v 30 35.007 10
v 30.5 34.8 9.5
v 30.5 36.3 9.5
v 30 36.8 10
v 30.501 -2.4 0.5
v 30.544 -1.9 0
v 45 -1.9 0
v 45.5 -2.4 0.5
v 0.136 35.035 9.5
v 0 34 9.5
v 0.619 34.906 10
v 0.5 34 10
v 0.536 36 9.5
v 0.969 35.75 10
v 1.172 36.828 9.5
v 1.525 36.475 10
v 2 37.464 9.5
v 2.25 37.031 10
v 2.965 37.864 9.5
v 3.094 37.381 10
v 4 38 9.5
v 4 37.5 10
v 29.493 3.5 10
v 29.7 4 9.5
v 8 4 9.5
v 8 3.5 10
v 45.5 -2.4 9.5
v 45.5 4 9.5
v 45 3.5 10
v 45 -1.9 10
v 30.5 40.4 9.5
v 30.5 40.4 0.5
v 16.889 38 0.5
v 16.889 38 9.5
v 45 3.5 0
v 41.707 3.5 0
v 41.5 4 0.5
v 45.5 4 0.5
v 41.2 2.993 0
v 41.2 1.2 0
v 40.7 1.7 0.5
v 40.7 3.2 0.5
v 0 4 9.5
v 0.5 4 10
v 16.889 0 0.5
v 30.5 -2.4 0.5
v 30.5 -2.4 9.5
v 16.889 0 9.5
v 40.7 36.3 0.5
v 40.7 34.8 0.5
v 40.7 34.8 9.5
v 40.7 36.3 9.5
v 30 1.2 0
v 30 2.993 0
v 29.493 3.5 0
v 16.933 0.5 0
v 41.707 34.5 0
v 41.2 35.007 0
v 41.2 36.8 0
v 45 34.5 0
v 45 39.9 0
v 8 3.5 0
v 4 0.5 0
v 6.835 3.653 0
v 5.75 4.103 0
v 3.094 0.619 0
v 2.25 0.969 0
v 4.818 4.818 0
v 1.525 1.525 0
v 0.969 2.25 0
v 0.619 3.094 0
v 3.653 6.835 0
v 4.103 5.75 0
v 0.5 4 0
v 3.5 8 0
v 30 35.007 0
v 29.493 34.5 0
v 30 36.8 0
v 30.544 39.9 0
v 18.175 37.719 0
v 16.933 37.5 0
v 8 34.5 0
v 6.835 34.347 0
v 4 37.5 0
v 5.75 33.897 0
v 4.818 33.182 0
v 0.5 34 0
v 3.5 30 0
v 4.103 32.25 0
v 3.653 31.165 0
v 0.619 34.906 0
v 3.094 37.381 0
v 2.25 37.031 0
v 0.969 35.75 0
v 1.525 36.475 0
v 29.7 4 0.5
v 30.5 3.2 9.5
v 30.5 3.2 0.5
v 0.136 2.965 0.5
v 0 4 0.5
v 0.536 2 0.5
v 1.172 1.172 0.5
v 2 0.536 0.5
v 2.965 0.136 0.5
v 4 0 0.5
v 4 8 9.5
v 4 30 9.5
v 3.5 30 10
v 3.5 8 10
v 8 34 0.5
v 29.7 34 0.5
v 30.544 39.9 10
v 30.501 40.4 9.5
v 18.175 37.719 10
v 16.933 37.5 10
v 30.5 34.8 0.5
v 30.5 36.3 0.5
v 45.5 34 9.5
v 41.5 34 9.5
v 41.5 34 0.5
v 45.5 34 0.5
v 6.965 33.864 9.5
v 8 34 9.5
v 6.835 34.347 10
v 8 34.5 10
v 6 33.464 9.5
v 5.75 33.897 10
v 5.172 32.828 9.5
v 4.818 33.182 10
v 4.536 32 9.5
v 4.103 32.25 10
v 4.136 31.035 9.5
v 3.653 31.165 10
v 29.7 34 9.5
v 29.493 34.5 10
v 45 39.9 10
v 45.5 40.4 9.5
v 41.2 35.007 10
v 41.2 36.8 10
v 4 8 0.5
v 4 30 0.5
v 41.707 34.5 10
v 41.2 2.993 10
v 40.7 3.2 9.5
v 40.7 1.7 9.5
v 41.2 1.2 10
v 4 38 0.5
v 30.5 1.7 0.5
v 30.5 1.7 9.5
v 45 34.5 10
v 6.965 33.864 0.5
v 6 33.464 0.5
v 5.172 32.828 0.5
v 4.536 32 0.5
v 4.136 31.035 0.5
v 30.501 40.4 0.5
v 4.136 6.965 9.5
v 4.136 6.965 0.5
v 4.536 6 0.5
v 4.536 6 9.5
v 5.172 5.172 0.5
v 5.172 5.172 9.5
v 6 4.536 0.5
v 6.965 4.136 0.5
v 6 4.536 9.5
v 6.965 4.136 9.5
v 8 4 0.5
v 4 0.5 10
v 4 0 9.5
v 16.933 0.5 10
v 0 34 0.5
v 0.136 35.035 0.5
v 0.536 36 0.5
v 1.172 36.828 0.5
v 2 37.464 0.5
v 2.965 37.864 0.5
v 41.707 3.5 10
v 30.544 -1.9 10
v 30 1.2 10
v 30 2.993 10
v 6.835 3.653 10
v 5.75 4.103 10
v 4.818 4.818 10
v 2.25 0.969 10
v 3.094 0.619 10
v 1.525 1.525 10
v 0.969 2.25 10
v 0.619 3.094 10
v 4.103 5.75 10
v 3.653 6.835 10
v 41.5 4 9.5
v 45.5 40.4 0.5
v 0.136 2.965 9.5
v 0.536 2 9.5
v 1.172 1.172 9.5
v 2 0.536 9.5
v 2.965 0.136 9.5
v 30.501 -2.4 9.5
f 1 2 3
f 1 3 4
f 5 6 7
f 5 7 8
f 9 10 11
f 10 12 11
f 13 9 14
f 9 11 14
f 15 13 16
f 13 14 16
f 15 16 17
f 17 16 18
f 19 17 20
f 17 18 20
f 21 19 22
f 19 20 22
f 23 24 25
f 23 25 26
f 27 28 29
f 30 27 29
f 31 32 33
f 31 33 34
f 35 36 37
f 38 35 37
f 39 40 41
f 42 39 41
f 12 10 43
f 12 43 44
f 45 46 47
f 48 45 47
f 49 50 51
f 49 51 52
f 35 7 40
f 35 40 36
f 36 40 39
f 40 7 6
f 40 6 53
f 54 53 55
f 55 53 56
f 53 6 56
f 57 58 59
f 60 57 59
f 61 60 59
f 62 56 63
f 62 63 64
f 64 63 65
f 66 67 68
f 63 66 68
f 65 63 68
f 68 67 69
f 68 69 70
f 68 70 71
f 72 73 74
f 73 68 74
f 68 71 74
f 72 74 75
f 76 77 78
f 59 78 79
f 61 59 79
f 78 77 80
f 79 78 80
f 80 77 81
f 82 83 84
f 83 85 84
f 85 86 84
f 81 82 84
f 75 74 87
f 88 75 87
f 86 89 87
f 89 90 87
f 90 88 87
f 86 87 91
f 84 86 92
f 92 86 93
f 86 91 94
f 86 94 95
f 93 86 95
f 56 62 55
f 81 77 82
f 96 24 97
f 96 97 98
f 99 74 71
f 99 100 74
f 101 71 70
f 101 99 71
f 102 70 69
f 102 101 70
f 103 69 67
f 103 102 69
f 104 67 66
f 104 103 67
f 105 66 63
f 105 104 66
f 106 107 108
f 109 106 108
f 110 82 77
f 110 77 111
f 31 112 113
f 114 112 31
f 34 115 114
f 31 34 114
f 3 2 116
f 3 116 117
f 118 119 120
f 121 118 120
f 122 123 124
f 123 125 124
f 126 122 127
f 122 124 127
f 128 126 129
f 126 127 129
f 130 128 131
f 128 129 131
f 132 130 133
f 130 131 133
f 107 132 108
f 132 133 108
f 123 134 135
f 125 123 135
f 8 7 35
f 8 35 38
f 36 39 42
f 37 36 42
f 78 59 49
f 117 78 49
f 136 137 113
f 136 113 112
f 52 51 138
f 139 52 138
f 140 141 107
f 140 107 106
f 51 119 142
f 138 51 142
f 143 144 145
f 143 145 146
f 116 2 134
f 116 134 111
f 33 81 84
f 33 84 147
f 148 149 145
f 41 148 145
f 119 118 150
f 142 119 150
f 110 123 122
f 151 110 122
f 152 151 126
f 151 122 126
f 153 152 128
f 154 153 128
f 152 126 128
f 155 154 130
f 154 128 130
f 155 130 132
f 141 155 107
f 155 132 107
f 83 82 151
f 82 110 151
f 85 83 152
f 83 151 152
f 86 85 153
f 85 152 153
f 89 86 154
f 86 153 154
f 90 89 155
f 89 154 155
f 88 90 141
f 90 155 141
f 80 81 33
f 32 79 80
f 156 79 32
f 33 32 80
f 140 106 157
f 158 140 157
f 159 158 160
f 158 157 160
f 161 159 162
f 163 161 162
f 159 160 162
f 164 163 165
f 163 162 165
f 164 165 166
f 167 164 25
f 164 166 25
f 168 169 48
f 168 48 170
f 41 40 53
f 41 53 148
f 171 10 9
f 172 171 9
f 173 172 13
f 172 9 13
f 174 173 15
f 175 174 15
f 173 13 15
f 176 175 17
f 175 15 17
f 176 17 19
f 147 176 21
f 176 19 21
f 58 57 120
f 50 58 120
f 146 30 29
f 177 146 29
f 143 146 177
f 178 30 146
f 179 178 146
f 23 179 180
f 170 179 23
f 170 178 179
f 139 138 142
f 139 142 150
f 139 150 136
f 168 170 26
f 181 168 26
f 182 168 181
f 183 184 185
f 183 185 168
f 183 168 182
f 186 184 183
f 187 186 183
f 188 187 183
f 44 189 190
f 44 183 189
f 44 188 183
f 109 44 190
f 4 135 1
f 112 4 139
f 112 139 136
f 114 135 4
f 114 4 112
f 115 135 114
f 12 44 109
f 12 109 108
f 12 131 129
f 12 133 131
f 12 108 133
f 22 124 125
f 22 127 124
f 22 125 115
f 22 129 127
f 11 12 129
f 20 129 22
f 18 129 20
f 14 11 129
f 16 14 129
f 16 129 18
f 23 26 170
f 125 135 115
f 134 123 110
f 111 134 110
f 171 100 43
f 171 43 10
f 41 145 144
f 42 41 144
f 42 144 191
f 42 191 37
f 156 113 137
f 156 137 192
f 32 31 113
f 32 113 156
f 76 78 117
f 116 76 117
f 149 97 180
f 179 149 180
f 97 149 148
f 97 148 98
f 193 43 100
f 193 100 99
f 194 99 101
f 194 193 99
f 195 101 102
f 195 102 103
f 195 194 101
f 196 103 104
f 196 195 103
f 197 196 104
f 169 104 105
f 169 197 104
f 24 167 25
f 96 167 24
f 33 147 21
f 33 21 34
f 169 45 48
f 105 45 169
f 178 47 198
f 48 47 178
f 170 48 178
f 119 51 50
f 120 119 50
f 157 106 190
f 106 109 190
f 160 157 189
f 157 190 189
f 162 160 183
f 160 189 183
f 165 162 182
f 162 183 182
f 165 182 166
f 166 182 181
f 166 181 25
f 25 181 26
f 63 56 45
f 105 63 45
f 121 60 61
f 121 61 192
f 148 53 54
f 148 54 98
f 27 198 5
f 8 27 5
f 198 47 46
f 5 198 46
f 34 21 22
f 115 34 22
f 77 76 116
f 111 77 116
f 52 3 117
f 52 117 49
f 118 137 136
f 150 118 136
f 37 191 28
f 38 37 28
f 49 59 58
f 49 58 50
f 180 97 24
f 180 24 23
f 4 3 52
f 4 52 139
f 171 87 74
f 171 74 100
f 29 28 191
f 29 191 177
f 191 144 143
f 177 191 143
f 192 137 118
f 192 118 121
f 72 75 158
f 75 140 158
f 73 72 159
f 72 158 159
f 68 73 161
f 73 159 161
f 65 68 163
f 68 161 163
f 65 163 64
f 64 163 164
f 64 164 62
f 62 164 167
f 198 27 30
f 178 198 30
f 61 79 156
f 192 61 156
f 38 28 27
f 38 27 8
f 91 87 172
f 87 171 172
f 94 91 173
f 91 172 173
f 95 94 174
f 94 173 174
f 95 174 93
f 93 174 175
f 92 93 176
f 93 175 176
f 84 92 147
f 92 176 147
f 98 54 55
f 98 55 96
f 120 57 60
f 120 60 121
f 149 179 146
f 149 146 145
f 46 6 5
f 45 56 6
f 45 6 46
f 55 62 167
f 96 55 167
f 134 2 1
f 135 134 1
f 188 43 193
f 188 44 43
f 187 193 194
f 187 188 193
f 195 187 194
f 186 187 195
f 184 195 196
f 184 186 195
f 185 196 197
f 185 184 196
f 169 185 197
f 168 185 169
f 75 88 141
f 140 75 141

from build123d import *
from OCP.BRepFilletAPI import BRepFilletAPI_MakeChamfer

# Parameters (mm, degrees)
BOSS_EXTRUDE1_DEPTH = 10
FILLET1_R           = 4
SKETCH3_W           = 10
SKETCH3_H           = 6.4
BOSS_EXTRUDE2_DEPTH = 15
SKETCH5_W           = 10.2
SKETCH5_H           = 34.6
CUT_EXTRUDE1_DEPTH  = 15
CHAMFER2_SIZE       = 13.611076367
CHAMFER2_SIZE_2     = 2.4
CHAMFER3_SIZE       = 0.8
CHAMFER1_SIZE       = 0.5


# Some blends are built 0.0001 mm under size
with BuildPart() as part:
    # Sketch1 → Boss-Extrude1 (new body)
    with BuildSketch(Plane.XY):
        Polygon((0, 0), (0, 38), (30.5, 38), (30.5, 34), (4, 34), (4, 4), (30.5, 4), (30.5, 0), align=None)
    extrude(amount=BOSS_EXTRUDE1_DEPTH)

    # Fillet1
    fillet1_edges = [part.edges().sort_by_distance(p)[0] for p in [
        (0, 0, 5),
        (0, 38, 5),
        (4, 34, 5),
        (4, 4, 5),
    ]]
    fillet(fillet1_edges, radius=FILLET1_R)

    # Sketch3 → Boss-Extrude2 (add)
    with BuildSketch(Plane(origin=(30.5, 0, 0), x_dir=(0, 0, -1), z_dir=(1, 0, 0))):
        with Locations((-5, 37.2)):
            Rectangle(SKETCH3_W, SKETCH3_H)
        with Locations((-5, 0.8)):
            Rectangle(SKETCH3_W, SKETCH3_H)
    extrude(amount=BOSS_EXTRUDE2_DEPTH)

    # Sketch5 → Cut-Extrude1 (cut)
    with BuildSketch(Plane.XY.offset(10)):
        with Locations((35.6, 19)):
            Rectangle(SKETCH5_W, SKETCH5_H)
    extrude(amount=-CUT_EXTRUDE1_DEPTH, mode=Mode.SUBTRACT)

    # Chamfer2
    chamfer2_edges_1 = [part.edges().sort_by_distance(p)[0] for p in [
        (30.5, 0, 5),
    ]]
    chamfer2_side_1 = [part.faces().sort_by_distance(p)[0] for p in [
        (30.452, 0, 5),
    ]]
    chamfer2_edges_2 = [part.edges().sort_by_distance(p)[0] for p in [
        (30.5, 38, 5),
    ]]
    chamfer2_side_2 = [part.faces().sort_by_distance(p)[0] for p in [
        (30.5, 38.048, 5),
    ]]
    chamfer2 = BRepFilletAPI_MakeChamfer(part.part.solid().wrapped)
    for e in chamfer2_edges_1:
        chamfer2.Add(CHAMFER2_SIZE - 0.0001, CHAMFER2_SIZE_2 - 0.0001, e.wrapped, chamfer2_side_1[0].wrapped)
    for e in chamfer2_edges_2:
        chamfer2.Add(CHAMFER2_SIZE_2 - 0.0001, CHAMFER2_SIZE - 0.0001, e.wrapped, chamfer2_side_2[0].wrapped)
    add(Compound.cast(chamfer2.Shape()), mode=Mode.REPLACE)  # a hair under: the kernel refuses the full size

    # Chamfer3
    chamfer3_edges = [part.edges().sort_by_distance(p)[0] for p in [
        (30.5, 4, 5),
        (30.5, 34, 5),
        (40.7, 34, 5),
        (40.7, 4, 5),
    ]]
    chamfer(chamfer3_edges, length=CHAMFER3_SIZE)

    # Chamfer1
    # the kernel refuses this chamfer: 0.5 mm, written as the material it takes off along each edge
    with BuildSketch(Plane(origin=(46.785841494, 4, 10), x_dir=(0, 0, -1), z_dir=(-1, 0, 0)), Plane(origin=(40.214158506, 34, 10), x_dir=(0, 0, -1), z_dir=(1, 0, 0))) as chamfer1_piece_1:
        Polygon((CHAMFER1_SIZE, 0), (0, CHAMFER1_SIZE), (0, 0), align=None)
    extrude(amount=6.571682988, mode=Mode.SUBTRACT)
    with BuildSketch(Plane(origin=(4, 38, 0), x_dir=(0, -1, 0), z_dir=(1, 0, 0))) as chamfer1_piece_2_section:
        Polygon((CHAMFER1_SIZE, 0), (0, -CHAMFER1_SIZE), (0, 0), align=None)
    chamfer1_piece_2 = extrude(amount=14.174865127, mode=Mode.PRIVATE)
    chamfer1_piece_2 = split(chamfer1_piece_2, bisect_by=Plane(origin=(4.237723472, 36.651756922, 1.369040484), z_dir=(-0.1227837169605106, 0.6963649609575091, -0.7071067811865536)), keep=Keep.TOP, mode=Mode.PRIVATE)
    add(chamfer1_piece_2, mode=Mode.SUBTRACT)
    with BuildSketch(Plane(origin=(4, 38, 10), x_dir=(0, 0, -1), z_dir=(1, 0, 0))) as chamfer1_piece_3_section:
        Polygon((CHAMFER1_SIZE, 0), (0, -CHAMFER1_SIZE), (0, 0), align=None)
    chamfer1_piece_3 = extrude(amount=14.174865127, mode=Mode.PRIVATE)
    chamfer1_piece_3 = split(chamfer1_piece_3, bisect_by=Plane(origin=(4.237723472, 36.651756922, 8.630959516), z_dir=(-0.1227837169605106, 0.6963649609575091, 0.7071067811865536)), keep=Keep.TOP, mode=Mode.PRIVATE)
    add(chamfer1_piece_3, mode=Mode.SUBTRACT)
    with BuildSketch(Plane(origin=(15.62271565, 0.2232766, 0), x_dir=(0.17364239776413462, 0.9848087721475283, 0), z_dir=(0.9848087721475283, -0.17364239776413462, 0))) as chamfer1_piece_4_section:
        Polygon((CHAMFER1_SIZE, 0), (0, CHAMFER1_SIZE), (0, 0), align=None)
    chamfer1_piece_4 = extrude(amount=16.392616302, mode=Mode.PRIVATE)
    chamfer1_piece_4 = split(chamfer1_piece_4, bisect_by=Plane(origin=(15.62271565, 0.3616383, 0.1383617), z_dir=(0, -0.7071067811865471, -0.7071067811865479)), keep=Keep.TOP, mode=Mode.PRIVATE)
    add(chamfer1_piece_4, mode=Mode.SUBTRACT)
    with BuildSketch(Plane(origin=(15.62271565, 0.2232766, 10), x_dir=(0, 0, -1), z_dir=(0.9848087721475283, -0.17364239776413462, 0))) as chamfer1_piece_5_section:
        Polygon((CHAMFER1_SIZE, 0), (0, CHAMFER1_SIZE), (0, 0), align=None)
    chamfer1_piece_5 = extrude(amount=16.392616302, mode=Mode.PRIVATE)
    chamfer1_piece_5 = split(chamfer1_piece_5, bisect_by=Plane(origin=(15.62271565, 0.3616383, 9.8616383), z_dir=(0, -0.7071067811865471, 0.7071067811865479)), keep=Keep.TOP, mode=Mode.PRIVATE)
    add(chamfer1_piece_5, mode=Mode.SUBTRACT)
    with BuildSketch(Plane(origin=(31.766307983, 40.6231766, 0), x_dir=(0.17364239776413495, -0.9848087721475282, 0), z_dir=(-0.9848087721475282, -0.17364239776413493, 0))) as chamfer1_piece_6_section:
        Polygon((CHAMFER1_SIZE, 0), (0, CHAMFER1_SIZE), (0, 0), align=None)
    chamfer1_piece_6 = extrude(amount=16.392616302, mode=Mode.PRIVATE)
    chamfer1_piece_6 = split(chamfer1_piece_6, bisect_by=Plane(origin=(31.766307983, 39.0615883, 1.5615883), z_dir=(0, 0.7071067811865476, -0.7071067811865476)), keep=Keep.TOP, mode=Mode.PRIVATE)
    add(chamfer1_piece_6, mode=Mode.SUBTRACT)
    with BuildSketch(Plane(origin=(31.766307983, 40.6231766, 10), x_dir=(0, 0, -1), z_dir=(-0.9848087721475282, -0.17364239776413493, 0))) as chamfer1_piece_7_section:
        Polygon((CHAMFER1_SIZE, 0), (0, CHAMFER1_SIZE), (0, 0), align=None)
    chamfer1_piece_7 = extrude(amount=16.392616302, mode=Mode.PRIVATE)
    chamfer1_piece_7 = split(chamfer1_piece_7, bisect_by=Plane(origin=(31.766307983, 39.0615883, 8.4384117), z_dir=(0, 0.7071067811865476, 0.7071067811865476)), keep=Keep.TOP, mode=Mode.PRIVATE)
    add(chamfer1_piece_7, mode=Mode.SUBTRACT)
    with BuildSketch(Plane(origin=(40.7, 37.585841494, 10), x_dir=(0, 0, -1), z_dir=(0, -1, 0))) as chamfer1_piece_8_section:
        Polygon((CHAMFER1_SIZE, 0), (0, CHAMFER1_SIZE), (0, 0), align=None)
    chamfer1_piece_8 = extrude(amount=4.071682988, mode=Mode.PRIVATE)
    chamfer1_piece_8 = split(chamfer1_piece_8, bisect_by=Plane(origin=(40.7, 37.192920747, 10.392920747), z_dir=(0, -0.7071067811865476, 0.7071067811865476)), keep=Keep.TOP, mode=Mode.PRIVATE)
    add(chamfer1_piece_8, mode=Mode.SUBTRACT)
    with BuildSketch(Plane(origin=(30.5, 0.414158506, 10), x_dir=(0, 0, -1), z_dir=(0, 1, 0))) as chamfer1_piece_9_section:
        Polygon((CHAMFER1_SIZE, 0), (0, CHAMFER1_SIZE), (0, 0), align=None)
    chamfer1_piece_9 = extrude(amount=4.071682988, mode=Mode.PRIVATE)
    chamfer1_piece_9 = split(chamfer1_piece_9, bisect_by=Plane(origin=(30.5, 0.807079253, 10.392920747), z_dir=(0, 0.7071067811865476, 0.7071067811865476)), keep=Keep.TOP, mode=Mode.PRIVATE)
    add(chamfer1_piece_9, mode=Mode.SUBTRACT)
    with BuildSketch(Plane(origin=(30.985841494, 4, 10), x_dir=(0, 0, -1), z_dir=(-1, 0, 0)), Plane(origin=(8, 34, 10), x_dir=(0, 0, -1), z_dir=(1, 0, 0))) as chamfer1_piece_10:
        Polygon((CHAMFER1_SIZE, 0), (0, CHAMFER1_SIZE), (0, 0), align=None)
    extrude(amount=22.985841494, mode=Mode.SUBTRACT)
    with BuildSketch(Plane(origin=(31.40922724, 35.70922724, 10), x_dir=(0, 0, -1), z_dir=(-0.7071067811865491, -0.707106781186546, 0)), Plane(origin=(42.40922724, 33.09077276, 10), x_dir=(0, 0, -1), z_dir=(-0.7071067811865476, 0.7071067811865476, 0)), Plane(origin=(31.40922724, 35.70922724, 0), x_dir=(-0.7071067811865459, 0.707106781186549, 0), z_dir=(-0.7071067811865491, -0.707106781186546, 0)), Plane(origin=(42.40922724, 33.09077276, 0), x_dir=(0.7071067811865476, 0.7071067811865476, 1.7763568394002363e-15), z_dir=(-0.7071067811865476, 0.7071067811865476, 0))) as chamfer1_piece_11:
        Polygon((CHAMFER1_SIZE, 0), (0, -CHAMFER1_SIZE), (0, 0), align=None)
    extrude(amount=3.703053838, mode=Mode.SUBTRACT)
    with BuildSketch(Plane(origin=(31.40922724, 2.29077276, 10), x_dir=(0, 0, -1), z_dir=(-0.7071067811865479, 0.7071067811865471, 0)), Plane(origin=(42.40922724, 4.90922724, 10), x_dir=(0, 0, -1), z_dir=(-0.7071067811865464, -0.7071067811865487, 0)), Plane(origin=(31.40922724, 2.29077276, 0), x_dir=(-0.7071067811865472, -0.7071067811865479, 0), z_dir=(-0.7071067811865479, 0.7071067811865471, 0)), Plane(origin=(42.40922724, 4.90922724, 0), x_dir=(0.7071067811865486, -0.7071067811865464, 0), z_dir=(-0.7071067811865464, -0.7071067811865487, 0))) as chamfer1_piece_12:
        Polygon((CHAMFER1_SIZE, 0), (0, CHAMFER1_SIZE), (0, 0), align=None)
    extrude(amount=3.703053838, mode=Mode.SUBTRACT)
    with BuildSketch(Plane(origin=(40.7, 0.414158506, 0), x_dir=(1, 0, 0), z_dir=(0, 1, 0))) as chamfer1_piece_13_section:
        Polygon((CHAMFER1_SIZE, 0), (0, -CHAMFER1_SIZE), (0, 0), align=None)
    chamfer1_piece_13 = extrude(amount=4.071682988, mode=Mode.PRIVATE)
    chamfer1_piece_13 = split(chamfer1_piece_13, bisect_by=Plane(origin=(40.7, 0.807079253, -0.392920747), z_dir=(0, 0.7071067811865476, -0.7071067811865476)), keep=Keep.TOP, mode=Mode.PRIVATE)
    add(chamfer1_piece_13, mode=Mode.SUBTRACT)
    with BuildSketch(Plane(origin=(30.5, 37.585841494, 0), x_dir=(-1, 0, 0), z_dir=(0, -1, 0))) as chamfer1_piece_14_section:
        Polygon((CHAMFER1_SIZE, 0), (0, -CHAMFER1_SIZE), (0, 0), align=None)
    chamfer1_piece_14 = extrude(amount=4.071682988, mode=Mode.PRIVATE)
    chamfer1_piece_14 = split(chamfer1_piece_14, bisect_by=Plane(origin=(30.5, 37.192920747, -0.392920747), z_dir=(0, -0.7071067811865476, -0.7071067811865476)), keep=Keep.TOP, mode=Mode.PRIVATE)
    add(chamfer1_piece_14, mode=Mode.SUBTRACT)
    with BuildSketch(Plane(origin=(8, 4, 0), x_dir=(0, -1, 0), z_dir=(1, 0, 0)), Plane(origin=(30.985841494, 34, 0), x_dir=(0, 1, 0), z_dir=(-1, 0, 0))) as chamfer1_piece_15:
        Polygon((CHAMFER1_SIZE, 0), (0, -CHAMFER1_SIZE), (0, 0), align=None)
    extrude(amount=22.985841494, mode=Mode.SUBTRACT)
    with BuildSketch(Plane(origin=(46.785841494, 34, 0), x_dir=(0, 1, 0), z_dir=(-1, 0, 0)), Plane(origin=(40.214158506, 4, 0), x_dir=(0, -1, 0), z_dir=(1, 0, 0))) as chamfer1_piece_16:
        Polygon((CHAMFER1_SIZE, 0), (0, -CHAMFER1_SIZE), (0, 0), align=None)
    extrude(amount=6.571682988, mode=Mode.SUBTRACT)
    with BuildSketch(Plane(origin=(4, 30, 0), x_dir=(-1, 0, 0), z_dir=(0, -1, 0)), Plane(origin=(4, 30, 10), x_dir=(0, 0, -1), z_dir=(0, -1, 0))) as chamfer1_piece_17:
        Polygon((CHAMFER1_SIZE, 0), (0, -CHAMFER1_SIZE), (0, 0), align=None)
    extrude(amount=22, mode=Mode.SUBTRACT)
    with BuildSketch(Plane(origin=(0, 4, 0), x_dir=(1, 0, 0), z_dir=(0, 1, 0)), Plane(origin=(0, 4, 10), x_dir=(0, 0, -1), z_dir=(0, 1, 0))) as chamfer1_piece_18:
        Polygon((CHAMFER1_SIZE, 0), (0, -CHAMFER1_SIZE), (0, 0), align=None)
    extrude(amount=30, mode=Mode.SUBTRACT)
    with BuildSketch(Plane(origin=(18.174865127, 0, 0), x_dir=(0, 1, 0), z_dir=(-1, 0, 0))) as chamfer1_piece_19_section:
        Polygon((CHAMFER1_SIZE, 0), (0, -CHAMFER1_SIZE), (0, 0), align=None)
    chamfer1_piece_19 = extrude(amount=14.174865127, mode=Mode.PRIVATE)
    chamfer1_piece_19 = split(chamfer1_piece_19, bisect_by=Plane(origin=(18.198890584, 0.136259816, 0.1383617), z_dir=(-0.12278371696051142, -0.6963649609575149, -0.7071067811865478)), keep=Keep.TOP, mode=Mode.PRIVATE)
    add(chamfer1_piece_19, mode=Mode.SUBTRACT)
    with BuildSketch(Plane(origin=(4, 4, 0), x_dir=(-1, 0, 0), z_dir=(0, 1, 0))) as chamfer1_piece_20:
        Polygon((4 - CHAMFER1_SIZE, 0), (4, CHAMFER1_SIZE), (4, 0), align=None)
    revolve(axis=Axis((4, 4, 0), (0, 0, 1)), revolution_arc=90, mode=Mode.SUBTRACT)
    with BuildSketch(Plane(origin=(4, 34, 0), x_dir=(-1, 0, 0), z_dir=(0, -1, 0))) as chamfer1_piece_21:
        Polygon((4 - CHAMFER1_SIZE, 0), (4, -CHAMFER1_SIZE), (4, 0), align=None)
    revolve(axis=Axis((4, 34, 0), (0, 0, -1)), revolution_arc=90, mode=Mode.SUBTRACT)
    with BuildSketch(Plane(origin=(18.174865127, 0, 10), x_dir=(0, 0, -1), z_dir=(-1, 0, 0))) as chamfer1_piece_22_section:
        Polygon((CHAMFER1_SIZE, 0), (0, -CHAMFER1_SIZE), (0, 0), align=None)
    chamfer1_piece_22 = extrude(amount=14.174865127, mode=Mode.PRIVATE)
    chamfer1_piece_22 = split(chamfer1_piece_22, bisect_by=Plane(origin=(18.198890584, 0.136259816, 9.8616383), z_dir=(-0.12278371696051138, -0.6963649609575147, 0.7071067811865477)), keep=Keep.TOP, mode=Mode.PRIVATE)
    add(chamfer1_piece_22, mode=Mode.SUBTRACT)
    with BuildSketch(Plane(origin=(4, 4, 10), x_dir=(-1, 0, 0), z_dir=(0, 1, 0))) as chamfer1_piece_23:
        Polygon((4, -CHAMFER1_SIZE), (4 - CHAMFER1_SIZE, 0), (4, 0), align=None)
    revolve(axis=Axis((4, 4, 10), (0, 0, 1)), revolution_arc=90, mode=Mode.SUBTRACT)
    with BuildSketch(Plane(origin=(4, 34, 10), x_dir=(-1, 0, 0), z_dir=(0, -1, 0))) as chamfer1_piece_24:
        Polygon((4, CHAMFER1_SIZE), (4 - CHAMFER1_SIZE, 0), (4, 0), align=None)
    revolve(axis=Axis((4, 34, 10), (0, 0, -1)), revolution_arc=90, mode=Mode.SUBTRACT)
    with BuildSketch(Plane(origin=(8, 8, 0), x_dir=(-1, 0, 0), z_dir=(0, 1, 0))) as chamfer1_piece_25:
        Polygon((4 + CHAMFER1_SIZE, 0), (4, CHAMFER1_SIZE), (4, 0), align=None)
    revolve(axis=Axis((8, 8, 0), (0, 0, 1)), revolution_arc=90, mode=Mode.SUBTRACT)
    with BuildSketch(Plane(origin=(8, 8, 10), x_dir=(-1, 0, 0), z_dir=(0, 1, 0))) as chamfer1_piece_26:
        Polygon((4, -CHAMFER1_SIZE), (4 + CHAMFER1_SIZE, 0), (4, 0), align=None)
    revolve(axis=Axis((8, 8, 10), (0, 0, 1)), revolution_arc=90, mode=Mode.SUBTRACT)
    with BuildSketch(Plane(origin=(8, 30, 0), x_dir=(0, 1, 0), z_dir=(1, 0, 0))) as chamfer1_piece_27:
        Polygon((4 + CHAMFER1_SIZE, 0), (4, CHAMFER1_SIZE), (4, 0), align=None)
    revolve(axis=Axis((8, 30, 0), (0, 0, 1)), revolution_arc=90, mode=Mode.SUBTRACT)
    with BuildSketch(Plane(origin=(8, 30, 10), x_dir=(0, 1, 0), z_dir=(1, 0, 0))) as chamfer1_piece_28:
        Polygon((4, -CHAMFER1_SIZE), (4 + CHAMFER1_SIZE, 0), (4, 0), align=None)
    revolve(axis=Axis((8, 30, 10), (0, 0, 1)), revolution_arc=90, mode=Mode.SUBTRACT)
    with BuildSketch(Plane(origin=(29.214158506, 40.4, 10), x_dir=(0, 0, -1), z_dir=(1, 0, 0)), Plane(origin=(29.214158506, 40.4, 0), x_dir=(0, -1, 0), z_dir=(1, 0, 0))) as chamfer1_piece_29:
        Polygon((CHAMFER1_SIZE, 0), (0, -CHAMFER1_SIZE), (0, 0), align=None)
    extrude(amount=17.571682988, mode=Mode.SUBTRACT)
    with BuildSketch(Plane(origin=(45.5, 41.685841494, 10), x_dir=(0, 0, -1), z_dir=(0, -1, 0)), Plane(origin=(45.5, 5.285841494, 10), x_dir=(0, 0, -1), z_dir=(0, -1, 0))) as chamfer1_piece_30:
        Polygon((CHAMFER1_SIZE, 0), (0, -CHAMFER1_SIZE), (0, 0), align=None)
    extrude(amount=8.971682988, mode=Mode.SUBTRACT)
    with BuildSketch(Plane(origin=(45.5, 32.714158506, 0), x_dir=(-1, 0, 0), z_dir=(0, 1, 0)), Plane(origin=(45.5, -3.685841494, 0), x_dir=(-1, 0, 0), z_dir=(0, 1, 0))) as chamfer1_piece_31:
        Polygon((CHAMFER1_SIZE, 0), (0, CHAMFER1_SIZE), (0, 0), align=None)
    extrude(amount=8.971682988, mode=Mode.SUBTRACT)
    with BuildSketch(Plane(origin=(29.214158506, -2.4, 0), x_dir=(0, 1, 0), z_dir=(1, 0, 0)), Plane(origin=(29.214158506, -2.4, 10), x_dir=(0, 0, -1), z_dir=(1, 0, 0))) as chamfer1_piece_32:
        Polygon((CHAMFER1_SIZE, 0), (0, CHAMFER1_SIZE), (0, 0), align=None)
    extrude(amount=17.571682988, mode=Mode.SUBTRACT)
    with BuildSketch(Plane(origin=(29.214158506, 1.7, 0), x_dir=(0, -1, 0), z_dir=(1, 0, 0))) as chamfer1_piece_33_section:
        Polygon((CHAMFER1_SIZE, 0), (0, -CHAMFER1_SIZE), (0, 0), align=None)
    chamfer1_piece_33 = extrude(amount=12.771682988, mode=Mode.PRIVATE)
    chamfer1_piece_33 = split(chamfer1_piece_33, bisect_by=Plane(origin=(35.207079253, 1.7, 5.992920747), z_dir=(-0.7071067811865476, 0, -0.7071067811865476)), keep=Keep.TOP, mode=Mode.PRIVATE)
    chamfer1_piece_33 = split(chamfer1_piece_33, bisect_by=Plane(origin=(29.607079253, 1.7, -0.392920747), z_dir=(0.7071067811865476, 0, -0.7071067811865476)), keep=Keep.TOP, mode=Mode.PRIVATE)
    add(chamfer1_piece_33, mode=Mode.SUBTRACT)
    with BuildSketch(Plane(origin=(30.5, 4.485841494, 0), x_dir=(-1, 0, 0), z_dir=(0, -1, 0))) as chamfer1_piece_34_section:
        Polygon((CHAMFER1_SIZE, 0), (0, -CHAMFER1_SIZE), (0, 0), align=None)
    chamfer1_piece_34 = extrude(amount=4.071682988, mode=Mode.PRIVATE)
    chamfer1_piece_34 = split(chamfer1_piece_34, bisect_by=Plane(origin=(30.5, 2.842920747, 1.642920747), z_dir=(0, 0.7071067811865476, -0.7071067811865476)), keep=Keep.TOP, mode=Mode.PRIVATE)
    add(chamfer1_piece_34, mode=Mode.SUBTRACT)
    with BuildSketch(Plane(origin=(40.7, 33.514158506, 0), x_dir=(1, 0, 0), z_dir=(0, 1, 0))) as chamfer1_piece_35_section:
        Polygon((CHAMFER1_SIZE, 0), (0, -CHAMFER1_SIZE), (0, 0), align=None)
    chamfer1_piece_35 = extrude(amount=4.071682988, mode=Mode.PRIVATE)
    chamfer1_piece_35 = split(chamfer1_piece_35, bisect_by=Plane(origin=(40.7, 35.157079253, 1.642920747), z_dir=(0, -0.7071067811865476, -0.7071067811865476)), keep=Keep.TOP, mode=Mode.PRIVATE)
    add(chamfer1_piece_35, mode=Mode.SUBTRACT)
    with BuildSketch(Plane(origin=(41.985841494, 36.3, 0), x_dir=(0, 1, 0), z_dir=(-1, 0, 0))) as chamfer1_piece_36_section:
        Polygon((CHAMFER1_SIZE, 0), (0, -CHAMFER1_SIZE), (0, 0), align=None)
    chamfer1_piece_36 = extrude(amount=12.771682988, mode=Mode.PRIVATE)
    chamfer1_piece_36 = split(chamfer1_piece_36, bisect_by=Plane(origin=(41.592920747, 36.3, -0.392920747), z_dir=(-0.7071067811865476, 0, -0.7071067811865476)), keep=Keep.TOP, mode=Mode.PRIVATE)
    chamfer1_piece_36 = split(chamfer1_piece_36, bisect_by=Plane(origin=(35.992920747, 36.3, 5.992920747), z_dir=(0.7071067811865476, 0, -0.7071067811865476)), keep=Keep.TOP, mode=Mode.PRIVATE)
    add(chamfer1_piece_36, mode=Mode.SUBTRACT)
    with BuildSketch(Plane(origin=(40.7, 4.485841494, 10), x_dir=(0, 0, -1), z_dir=(0, -1, 0))) as chamfer1_piece_37_section:
        Polygon((CHAMFER1_SIZE, 0), (0, CHAMFER1_SIZE), (0, 0), align=None)
    chamfer1_piece_37 = extrude(amount=4.071682988, mode=Mode.PRIVATE)
    chamfer1_piece_37 = split(chamfer1_piece_37, bisect_by=Plane(origin=(40.7, 2.842920747, 8.357079253), z_dir=(0, 0.7071067811865476, 0.7071067811865476)), keep=Keep.TOP, mode=Mode.PRIVATE)
    add(chamfer1_piece_37, mode=Mode.SUBTRACT)
    with BuildSketch(Plane(origin=(41.985841494, 1.7, 10), x_dir=(0, 0, -1), z_dir=(-1, 0, 0))) as chamfer1_piece_38_section:
        Polygon((CHAMFER1_SIZE, 0), (0, CHAMFER1_SIZE), (0, 0), align=None)
    chamfer1_piece_38 = extrude(amount=12.771682988, mode=Mode.PRIVATE)
    chamfer1_piece_38 = split(chamfer1_piece_38, bisect_by=Plane(origin=(35.992920747, 1.7, 4.007079253), z_dir=(0.7071067811865476, 0, 0.7071067811865476)), keep=Keep.TOP, mode=Mode.PRIVATE)
    chamfer1_piece_38 = split(chamfer1_piece_38, bisect_by=Plane(origin=(41.592920747, 1.7, 10.392920747), z_dir=(-0.7071067811865476, 0, 0.7071067811865476)), keep=Keep.TOP, mode=Mode.PRIVATE)
    add(chamfer1_piece_38, mode=Mode.SUBTRACT)
    with BuildSketch(Plane(origin=(30.5, 33.514158506, 10), x_dir=(0, 0, -1), z_dir=(0, 1, 0))) as chamfer1_piece_39_section:
        Polygon((CHAMFER1_SIZE, 0), (0, CHAMFER1_SIZE), (0, 0), align=None)
    chamfer1_piece_39 = extrude(amount=4.071682988, mode=Mode.PRIVATE)
    chamfer1_piece_39 = split(chamfer1_piece_39, bisect_by=Plane(origin=(30.5, 35.157079253, 8.357079253), z_dir=(0, -0.7071067811865476, 0.7071067811865476)), keep=Keep.TOP, mode=Mode.PRIVATE)
    add(chamfer1_piece_39, mode=Mode.SUBTRACT)
    with BuildSketch(Plane(origin=(29.214158506, 36.3, 10), x_dir=(0, 0, -1), z_dir=(1, 0, 0))) as chamfer1_piece_40_section:
        Polygon((CHAMFER1_SIZE, 0), (0, CHAMFER1_SIZE), (0, 0), align=None)
    chamfer1_piece_40 = extrude(amount=12.771682988, mode=Mode.PRIVATE)
    chamfer1_piece_40 = split(chamfer1_piece_40, bisect_by=Plane(origin=(35.207079253, 36.3, 4.007079253), z_dir=(-0.7071067811865476, 0, 0.7071067811865476)), keep=Keep.TOP, mode=Mode.PRIVATE)
    chamfer1_piece_40 = split(chamfer1_piece_40, bisect_by=Plane(origin=(29.607079253, 36.3, 10.392920747), z_dir=(0.7071067811865476, 0, 0.7071067811865476)), keep=Keep.TOP, mode=Mode.PRIVATE)
    add(chamfer1_piece_40, mode=Mode.SUBTRACT)


solid = part.part
